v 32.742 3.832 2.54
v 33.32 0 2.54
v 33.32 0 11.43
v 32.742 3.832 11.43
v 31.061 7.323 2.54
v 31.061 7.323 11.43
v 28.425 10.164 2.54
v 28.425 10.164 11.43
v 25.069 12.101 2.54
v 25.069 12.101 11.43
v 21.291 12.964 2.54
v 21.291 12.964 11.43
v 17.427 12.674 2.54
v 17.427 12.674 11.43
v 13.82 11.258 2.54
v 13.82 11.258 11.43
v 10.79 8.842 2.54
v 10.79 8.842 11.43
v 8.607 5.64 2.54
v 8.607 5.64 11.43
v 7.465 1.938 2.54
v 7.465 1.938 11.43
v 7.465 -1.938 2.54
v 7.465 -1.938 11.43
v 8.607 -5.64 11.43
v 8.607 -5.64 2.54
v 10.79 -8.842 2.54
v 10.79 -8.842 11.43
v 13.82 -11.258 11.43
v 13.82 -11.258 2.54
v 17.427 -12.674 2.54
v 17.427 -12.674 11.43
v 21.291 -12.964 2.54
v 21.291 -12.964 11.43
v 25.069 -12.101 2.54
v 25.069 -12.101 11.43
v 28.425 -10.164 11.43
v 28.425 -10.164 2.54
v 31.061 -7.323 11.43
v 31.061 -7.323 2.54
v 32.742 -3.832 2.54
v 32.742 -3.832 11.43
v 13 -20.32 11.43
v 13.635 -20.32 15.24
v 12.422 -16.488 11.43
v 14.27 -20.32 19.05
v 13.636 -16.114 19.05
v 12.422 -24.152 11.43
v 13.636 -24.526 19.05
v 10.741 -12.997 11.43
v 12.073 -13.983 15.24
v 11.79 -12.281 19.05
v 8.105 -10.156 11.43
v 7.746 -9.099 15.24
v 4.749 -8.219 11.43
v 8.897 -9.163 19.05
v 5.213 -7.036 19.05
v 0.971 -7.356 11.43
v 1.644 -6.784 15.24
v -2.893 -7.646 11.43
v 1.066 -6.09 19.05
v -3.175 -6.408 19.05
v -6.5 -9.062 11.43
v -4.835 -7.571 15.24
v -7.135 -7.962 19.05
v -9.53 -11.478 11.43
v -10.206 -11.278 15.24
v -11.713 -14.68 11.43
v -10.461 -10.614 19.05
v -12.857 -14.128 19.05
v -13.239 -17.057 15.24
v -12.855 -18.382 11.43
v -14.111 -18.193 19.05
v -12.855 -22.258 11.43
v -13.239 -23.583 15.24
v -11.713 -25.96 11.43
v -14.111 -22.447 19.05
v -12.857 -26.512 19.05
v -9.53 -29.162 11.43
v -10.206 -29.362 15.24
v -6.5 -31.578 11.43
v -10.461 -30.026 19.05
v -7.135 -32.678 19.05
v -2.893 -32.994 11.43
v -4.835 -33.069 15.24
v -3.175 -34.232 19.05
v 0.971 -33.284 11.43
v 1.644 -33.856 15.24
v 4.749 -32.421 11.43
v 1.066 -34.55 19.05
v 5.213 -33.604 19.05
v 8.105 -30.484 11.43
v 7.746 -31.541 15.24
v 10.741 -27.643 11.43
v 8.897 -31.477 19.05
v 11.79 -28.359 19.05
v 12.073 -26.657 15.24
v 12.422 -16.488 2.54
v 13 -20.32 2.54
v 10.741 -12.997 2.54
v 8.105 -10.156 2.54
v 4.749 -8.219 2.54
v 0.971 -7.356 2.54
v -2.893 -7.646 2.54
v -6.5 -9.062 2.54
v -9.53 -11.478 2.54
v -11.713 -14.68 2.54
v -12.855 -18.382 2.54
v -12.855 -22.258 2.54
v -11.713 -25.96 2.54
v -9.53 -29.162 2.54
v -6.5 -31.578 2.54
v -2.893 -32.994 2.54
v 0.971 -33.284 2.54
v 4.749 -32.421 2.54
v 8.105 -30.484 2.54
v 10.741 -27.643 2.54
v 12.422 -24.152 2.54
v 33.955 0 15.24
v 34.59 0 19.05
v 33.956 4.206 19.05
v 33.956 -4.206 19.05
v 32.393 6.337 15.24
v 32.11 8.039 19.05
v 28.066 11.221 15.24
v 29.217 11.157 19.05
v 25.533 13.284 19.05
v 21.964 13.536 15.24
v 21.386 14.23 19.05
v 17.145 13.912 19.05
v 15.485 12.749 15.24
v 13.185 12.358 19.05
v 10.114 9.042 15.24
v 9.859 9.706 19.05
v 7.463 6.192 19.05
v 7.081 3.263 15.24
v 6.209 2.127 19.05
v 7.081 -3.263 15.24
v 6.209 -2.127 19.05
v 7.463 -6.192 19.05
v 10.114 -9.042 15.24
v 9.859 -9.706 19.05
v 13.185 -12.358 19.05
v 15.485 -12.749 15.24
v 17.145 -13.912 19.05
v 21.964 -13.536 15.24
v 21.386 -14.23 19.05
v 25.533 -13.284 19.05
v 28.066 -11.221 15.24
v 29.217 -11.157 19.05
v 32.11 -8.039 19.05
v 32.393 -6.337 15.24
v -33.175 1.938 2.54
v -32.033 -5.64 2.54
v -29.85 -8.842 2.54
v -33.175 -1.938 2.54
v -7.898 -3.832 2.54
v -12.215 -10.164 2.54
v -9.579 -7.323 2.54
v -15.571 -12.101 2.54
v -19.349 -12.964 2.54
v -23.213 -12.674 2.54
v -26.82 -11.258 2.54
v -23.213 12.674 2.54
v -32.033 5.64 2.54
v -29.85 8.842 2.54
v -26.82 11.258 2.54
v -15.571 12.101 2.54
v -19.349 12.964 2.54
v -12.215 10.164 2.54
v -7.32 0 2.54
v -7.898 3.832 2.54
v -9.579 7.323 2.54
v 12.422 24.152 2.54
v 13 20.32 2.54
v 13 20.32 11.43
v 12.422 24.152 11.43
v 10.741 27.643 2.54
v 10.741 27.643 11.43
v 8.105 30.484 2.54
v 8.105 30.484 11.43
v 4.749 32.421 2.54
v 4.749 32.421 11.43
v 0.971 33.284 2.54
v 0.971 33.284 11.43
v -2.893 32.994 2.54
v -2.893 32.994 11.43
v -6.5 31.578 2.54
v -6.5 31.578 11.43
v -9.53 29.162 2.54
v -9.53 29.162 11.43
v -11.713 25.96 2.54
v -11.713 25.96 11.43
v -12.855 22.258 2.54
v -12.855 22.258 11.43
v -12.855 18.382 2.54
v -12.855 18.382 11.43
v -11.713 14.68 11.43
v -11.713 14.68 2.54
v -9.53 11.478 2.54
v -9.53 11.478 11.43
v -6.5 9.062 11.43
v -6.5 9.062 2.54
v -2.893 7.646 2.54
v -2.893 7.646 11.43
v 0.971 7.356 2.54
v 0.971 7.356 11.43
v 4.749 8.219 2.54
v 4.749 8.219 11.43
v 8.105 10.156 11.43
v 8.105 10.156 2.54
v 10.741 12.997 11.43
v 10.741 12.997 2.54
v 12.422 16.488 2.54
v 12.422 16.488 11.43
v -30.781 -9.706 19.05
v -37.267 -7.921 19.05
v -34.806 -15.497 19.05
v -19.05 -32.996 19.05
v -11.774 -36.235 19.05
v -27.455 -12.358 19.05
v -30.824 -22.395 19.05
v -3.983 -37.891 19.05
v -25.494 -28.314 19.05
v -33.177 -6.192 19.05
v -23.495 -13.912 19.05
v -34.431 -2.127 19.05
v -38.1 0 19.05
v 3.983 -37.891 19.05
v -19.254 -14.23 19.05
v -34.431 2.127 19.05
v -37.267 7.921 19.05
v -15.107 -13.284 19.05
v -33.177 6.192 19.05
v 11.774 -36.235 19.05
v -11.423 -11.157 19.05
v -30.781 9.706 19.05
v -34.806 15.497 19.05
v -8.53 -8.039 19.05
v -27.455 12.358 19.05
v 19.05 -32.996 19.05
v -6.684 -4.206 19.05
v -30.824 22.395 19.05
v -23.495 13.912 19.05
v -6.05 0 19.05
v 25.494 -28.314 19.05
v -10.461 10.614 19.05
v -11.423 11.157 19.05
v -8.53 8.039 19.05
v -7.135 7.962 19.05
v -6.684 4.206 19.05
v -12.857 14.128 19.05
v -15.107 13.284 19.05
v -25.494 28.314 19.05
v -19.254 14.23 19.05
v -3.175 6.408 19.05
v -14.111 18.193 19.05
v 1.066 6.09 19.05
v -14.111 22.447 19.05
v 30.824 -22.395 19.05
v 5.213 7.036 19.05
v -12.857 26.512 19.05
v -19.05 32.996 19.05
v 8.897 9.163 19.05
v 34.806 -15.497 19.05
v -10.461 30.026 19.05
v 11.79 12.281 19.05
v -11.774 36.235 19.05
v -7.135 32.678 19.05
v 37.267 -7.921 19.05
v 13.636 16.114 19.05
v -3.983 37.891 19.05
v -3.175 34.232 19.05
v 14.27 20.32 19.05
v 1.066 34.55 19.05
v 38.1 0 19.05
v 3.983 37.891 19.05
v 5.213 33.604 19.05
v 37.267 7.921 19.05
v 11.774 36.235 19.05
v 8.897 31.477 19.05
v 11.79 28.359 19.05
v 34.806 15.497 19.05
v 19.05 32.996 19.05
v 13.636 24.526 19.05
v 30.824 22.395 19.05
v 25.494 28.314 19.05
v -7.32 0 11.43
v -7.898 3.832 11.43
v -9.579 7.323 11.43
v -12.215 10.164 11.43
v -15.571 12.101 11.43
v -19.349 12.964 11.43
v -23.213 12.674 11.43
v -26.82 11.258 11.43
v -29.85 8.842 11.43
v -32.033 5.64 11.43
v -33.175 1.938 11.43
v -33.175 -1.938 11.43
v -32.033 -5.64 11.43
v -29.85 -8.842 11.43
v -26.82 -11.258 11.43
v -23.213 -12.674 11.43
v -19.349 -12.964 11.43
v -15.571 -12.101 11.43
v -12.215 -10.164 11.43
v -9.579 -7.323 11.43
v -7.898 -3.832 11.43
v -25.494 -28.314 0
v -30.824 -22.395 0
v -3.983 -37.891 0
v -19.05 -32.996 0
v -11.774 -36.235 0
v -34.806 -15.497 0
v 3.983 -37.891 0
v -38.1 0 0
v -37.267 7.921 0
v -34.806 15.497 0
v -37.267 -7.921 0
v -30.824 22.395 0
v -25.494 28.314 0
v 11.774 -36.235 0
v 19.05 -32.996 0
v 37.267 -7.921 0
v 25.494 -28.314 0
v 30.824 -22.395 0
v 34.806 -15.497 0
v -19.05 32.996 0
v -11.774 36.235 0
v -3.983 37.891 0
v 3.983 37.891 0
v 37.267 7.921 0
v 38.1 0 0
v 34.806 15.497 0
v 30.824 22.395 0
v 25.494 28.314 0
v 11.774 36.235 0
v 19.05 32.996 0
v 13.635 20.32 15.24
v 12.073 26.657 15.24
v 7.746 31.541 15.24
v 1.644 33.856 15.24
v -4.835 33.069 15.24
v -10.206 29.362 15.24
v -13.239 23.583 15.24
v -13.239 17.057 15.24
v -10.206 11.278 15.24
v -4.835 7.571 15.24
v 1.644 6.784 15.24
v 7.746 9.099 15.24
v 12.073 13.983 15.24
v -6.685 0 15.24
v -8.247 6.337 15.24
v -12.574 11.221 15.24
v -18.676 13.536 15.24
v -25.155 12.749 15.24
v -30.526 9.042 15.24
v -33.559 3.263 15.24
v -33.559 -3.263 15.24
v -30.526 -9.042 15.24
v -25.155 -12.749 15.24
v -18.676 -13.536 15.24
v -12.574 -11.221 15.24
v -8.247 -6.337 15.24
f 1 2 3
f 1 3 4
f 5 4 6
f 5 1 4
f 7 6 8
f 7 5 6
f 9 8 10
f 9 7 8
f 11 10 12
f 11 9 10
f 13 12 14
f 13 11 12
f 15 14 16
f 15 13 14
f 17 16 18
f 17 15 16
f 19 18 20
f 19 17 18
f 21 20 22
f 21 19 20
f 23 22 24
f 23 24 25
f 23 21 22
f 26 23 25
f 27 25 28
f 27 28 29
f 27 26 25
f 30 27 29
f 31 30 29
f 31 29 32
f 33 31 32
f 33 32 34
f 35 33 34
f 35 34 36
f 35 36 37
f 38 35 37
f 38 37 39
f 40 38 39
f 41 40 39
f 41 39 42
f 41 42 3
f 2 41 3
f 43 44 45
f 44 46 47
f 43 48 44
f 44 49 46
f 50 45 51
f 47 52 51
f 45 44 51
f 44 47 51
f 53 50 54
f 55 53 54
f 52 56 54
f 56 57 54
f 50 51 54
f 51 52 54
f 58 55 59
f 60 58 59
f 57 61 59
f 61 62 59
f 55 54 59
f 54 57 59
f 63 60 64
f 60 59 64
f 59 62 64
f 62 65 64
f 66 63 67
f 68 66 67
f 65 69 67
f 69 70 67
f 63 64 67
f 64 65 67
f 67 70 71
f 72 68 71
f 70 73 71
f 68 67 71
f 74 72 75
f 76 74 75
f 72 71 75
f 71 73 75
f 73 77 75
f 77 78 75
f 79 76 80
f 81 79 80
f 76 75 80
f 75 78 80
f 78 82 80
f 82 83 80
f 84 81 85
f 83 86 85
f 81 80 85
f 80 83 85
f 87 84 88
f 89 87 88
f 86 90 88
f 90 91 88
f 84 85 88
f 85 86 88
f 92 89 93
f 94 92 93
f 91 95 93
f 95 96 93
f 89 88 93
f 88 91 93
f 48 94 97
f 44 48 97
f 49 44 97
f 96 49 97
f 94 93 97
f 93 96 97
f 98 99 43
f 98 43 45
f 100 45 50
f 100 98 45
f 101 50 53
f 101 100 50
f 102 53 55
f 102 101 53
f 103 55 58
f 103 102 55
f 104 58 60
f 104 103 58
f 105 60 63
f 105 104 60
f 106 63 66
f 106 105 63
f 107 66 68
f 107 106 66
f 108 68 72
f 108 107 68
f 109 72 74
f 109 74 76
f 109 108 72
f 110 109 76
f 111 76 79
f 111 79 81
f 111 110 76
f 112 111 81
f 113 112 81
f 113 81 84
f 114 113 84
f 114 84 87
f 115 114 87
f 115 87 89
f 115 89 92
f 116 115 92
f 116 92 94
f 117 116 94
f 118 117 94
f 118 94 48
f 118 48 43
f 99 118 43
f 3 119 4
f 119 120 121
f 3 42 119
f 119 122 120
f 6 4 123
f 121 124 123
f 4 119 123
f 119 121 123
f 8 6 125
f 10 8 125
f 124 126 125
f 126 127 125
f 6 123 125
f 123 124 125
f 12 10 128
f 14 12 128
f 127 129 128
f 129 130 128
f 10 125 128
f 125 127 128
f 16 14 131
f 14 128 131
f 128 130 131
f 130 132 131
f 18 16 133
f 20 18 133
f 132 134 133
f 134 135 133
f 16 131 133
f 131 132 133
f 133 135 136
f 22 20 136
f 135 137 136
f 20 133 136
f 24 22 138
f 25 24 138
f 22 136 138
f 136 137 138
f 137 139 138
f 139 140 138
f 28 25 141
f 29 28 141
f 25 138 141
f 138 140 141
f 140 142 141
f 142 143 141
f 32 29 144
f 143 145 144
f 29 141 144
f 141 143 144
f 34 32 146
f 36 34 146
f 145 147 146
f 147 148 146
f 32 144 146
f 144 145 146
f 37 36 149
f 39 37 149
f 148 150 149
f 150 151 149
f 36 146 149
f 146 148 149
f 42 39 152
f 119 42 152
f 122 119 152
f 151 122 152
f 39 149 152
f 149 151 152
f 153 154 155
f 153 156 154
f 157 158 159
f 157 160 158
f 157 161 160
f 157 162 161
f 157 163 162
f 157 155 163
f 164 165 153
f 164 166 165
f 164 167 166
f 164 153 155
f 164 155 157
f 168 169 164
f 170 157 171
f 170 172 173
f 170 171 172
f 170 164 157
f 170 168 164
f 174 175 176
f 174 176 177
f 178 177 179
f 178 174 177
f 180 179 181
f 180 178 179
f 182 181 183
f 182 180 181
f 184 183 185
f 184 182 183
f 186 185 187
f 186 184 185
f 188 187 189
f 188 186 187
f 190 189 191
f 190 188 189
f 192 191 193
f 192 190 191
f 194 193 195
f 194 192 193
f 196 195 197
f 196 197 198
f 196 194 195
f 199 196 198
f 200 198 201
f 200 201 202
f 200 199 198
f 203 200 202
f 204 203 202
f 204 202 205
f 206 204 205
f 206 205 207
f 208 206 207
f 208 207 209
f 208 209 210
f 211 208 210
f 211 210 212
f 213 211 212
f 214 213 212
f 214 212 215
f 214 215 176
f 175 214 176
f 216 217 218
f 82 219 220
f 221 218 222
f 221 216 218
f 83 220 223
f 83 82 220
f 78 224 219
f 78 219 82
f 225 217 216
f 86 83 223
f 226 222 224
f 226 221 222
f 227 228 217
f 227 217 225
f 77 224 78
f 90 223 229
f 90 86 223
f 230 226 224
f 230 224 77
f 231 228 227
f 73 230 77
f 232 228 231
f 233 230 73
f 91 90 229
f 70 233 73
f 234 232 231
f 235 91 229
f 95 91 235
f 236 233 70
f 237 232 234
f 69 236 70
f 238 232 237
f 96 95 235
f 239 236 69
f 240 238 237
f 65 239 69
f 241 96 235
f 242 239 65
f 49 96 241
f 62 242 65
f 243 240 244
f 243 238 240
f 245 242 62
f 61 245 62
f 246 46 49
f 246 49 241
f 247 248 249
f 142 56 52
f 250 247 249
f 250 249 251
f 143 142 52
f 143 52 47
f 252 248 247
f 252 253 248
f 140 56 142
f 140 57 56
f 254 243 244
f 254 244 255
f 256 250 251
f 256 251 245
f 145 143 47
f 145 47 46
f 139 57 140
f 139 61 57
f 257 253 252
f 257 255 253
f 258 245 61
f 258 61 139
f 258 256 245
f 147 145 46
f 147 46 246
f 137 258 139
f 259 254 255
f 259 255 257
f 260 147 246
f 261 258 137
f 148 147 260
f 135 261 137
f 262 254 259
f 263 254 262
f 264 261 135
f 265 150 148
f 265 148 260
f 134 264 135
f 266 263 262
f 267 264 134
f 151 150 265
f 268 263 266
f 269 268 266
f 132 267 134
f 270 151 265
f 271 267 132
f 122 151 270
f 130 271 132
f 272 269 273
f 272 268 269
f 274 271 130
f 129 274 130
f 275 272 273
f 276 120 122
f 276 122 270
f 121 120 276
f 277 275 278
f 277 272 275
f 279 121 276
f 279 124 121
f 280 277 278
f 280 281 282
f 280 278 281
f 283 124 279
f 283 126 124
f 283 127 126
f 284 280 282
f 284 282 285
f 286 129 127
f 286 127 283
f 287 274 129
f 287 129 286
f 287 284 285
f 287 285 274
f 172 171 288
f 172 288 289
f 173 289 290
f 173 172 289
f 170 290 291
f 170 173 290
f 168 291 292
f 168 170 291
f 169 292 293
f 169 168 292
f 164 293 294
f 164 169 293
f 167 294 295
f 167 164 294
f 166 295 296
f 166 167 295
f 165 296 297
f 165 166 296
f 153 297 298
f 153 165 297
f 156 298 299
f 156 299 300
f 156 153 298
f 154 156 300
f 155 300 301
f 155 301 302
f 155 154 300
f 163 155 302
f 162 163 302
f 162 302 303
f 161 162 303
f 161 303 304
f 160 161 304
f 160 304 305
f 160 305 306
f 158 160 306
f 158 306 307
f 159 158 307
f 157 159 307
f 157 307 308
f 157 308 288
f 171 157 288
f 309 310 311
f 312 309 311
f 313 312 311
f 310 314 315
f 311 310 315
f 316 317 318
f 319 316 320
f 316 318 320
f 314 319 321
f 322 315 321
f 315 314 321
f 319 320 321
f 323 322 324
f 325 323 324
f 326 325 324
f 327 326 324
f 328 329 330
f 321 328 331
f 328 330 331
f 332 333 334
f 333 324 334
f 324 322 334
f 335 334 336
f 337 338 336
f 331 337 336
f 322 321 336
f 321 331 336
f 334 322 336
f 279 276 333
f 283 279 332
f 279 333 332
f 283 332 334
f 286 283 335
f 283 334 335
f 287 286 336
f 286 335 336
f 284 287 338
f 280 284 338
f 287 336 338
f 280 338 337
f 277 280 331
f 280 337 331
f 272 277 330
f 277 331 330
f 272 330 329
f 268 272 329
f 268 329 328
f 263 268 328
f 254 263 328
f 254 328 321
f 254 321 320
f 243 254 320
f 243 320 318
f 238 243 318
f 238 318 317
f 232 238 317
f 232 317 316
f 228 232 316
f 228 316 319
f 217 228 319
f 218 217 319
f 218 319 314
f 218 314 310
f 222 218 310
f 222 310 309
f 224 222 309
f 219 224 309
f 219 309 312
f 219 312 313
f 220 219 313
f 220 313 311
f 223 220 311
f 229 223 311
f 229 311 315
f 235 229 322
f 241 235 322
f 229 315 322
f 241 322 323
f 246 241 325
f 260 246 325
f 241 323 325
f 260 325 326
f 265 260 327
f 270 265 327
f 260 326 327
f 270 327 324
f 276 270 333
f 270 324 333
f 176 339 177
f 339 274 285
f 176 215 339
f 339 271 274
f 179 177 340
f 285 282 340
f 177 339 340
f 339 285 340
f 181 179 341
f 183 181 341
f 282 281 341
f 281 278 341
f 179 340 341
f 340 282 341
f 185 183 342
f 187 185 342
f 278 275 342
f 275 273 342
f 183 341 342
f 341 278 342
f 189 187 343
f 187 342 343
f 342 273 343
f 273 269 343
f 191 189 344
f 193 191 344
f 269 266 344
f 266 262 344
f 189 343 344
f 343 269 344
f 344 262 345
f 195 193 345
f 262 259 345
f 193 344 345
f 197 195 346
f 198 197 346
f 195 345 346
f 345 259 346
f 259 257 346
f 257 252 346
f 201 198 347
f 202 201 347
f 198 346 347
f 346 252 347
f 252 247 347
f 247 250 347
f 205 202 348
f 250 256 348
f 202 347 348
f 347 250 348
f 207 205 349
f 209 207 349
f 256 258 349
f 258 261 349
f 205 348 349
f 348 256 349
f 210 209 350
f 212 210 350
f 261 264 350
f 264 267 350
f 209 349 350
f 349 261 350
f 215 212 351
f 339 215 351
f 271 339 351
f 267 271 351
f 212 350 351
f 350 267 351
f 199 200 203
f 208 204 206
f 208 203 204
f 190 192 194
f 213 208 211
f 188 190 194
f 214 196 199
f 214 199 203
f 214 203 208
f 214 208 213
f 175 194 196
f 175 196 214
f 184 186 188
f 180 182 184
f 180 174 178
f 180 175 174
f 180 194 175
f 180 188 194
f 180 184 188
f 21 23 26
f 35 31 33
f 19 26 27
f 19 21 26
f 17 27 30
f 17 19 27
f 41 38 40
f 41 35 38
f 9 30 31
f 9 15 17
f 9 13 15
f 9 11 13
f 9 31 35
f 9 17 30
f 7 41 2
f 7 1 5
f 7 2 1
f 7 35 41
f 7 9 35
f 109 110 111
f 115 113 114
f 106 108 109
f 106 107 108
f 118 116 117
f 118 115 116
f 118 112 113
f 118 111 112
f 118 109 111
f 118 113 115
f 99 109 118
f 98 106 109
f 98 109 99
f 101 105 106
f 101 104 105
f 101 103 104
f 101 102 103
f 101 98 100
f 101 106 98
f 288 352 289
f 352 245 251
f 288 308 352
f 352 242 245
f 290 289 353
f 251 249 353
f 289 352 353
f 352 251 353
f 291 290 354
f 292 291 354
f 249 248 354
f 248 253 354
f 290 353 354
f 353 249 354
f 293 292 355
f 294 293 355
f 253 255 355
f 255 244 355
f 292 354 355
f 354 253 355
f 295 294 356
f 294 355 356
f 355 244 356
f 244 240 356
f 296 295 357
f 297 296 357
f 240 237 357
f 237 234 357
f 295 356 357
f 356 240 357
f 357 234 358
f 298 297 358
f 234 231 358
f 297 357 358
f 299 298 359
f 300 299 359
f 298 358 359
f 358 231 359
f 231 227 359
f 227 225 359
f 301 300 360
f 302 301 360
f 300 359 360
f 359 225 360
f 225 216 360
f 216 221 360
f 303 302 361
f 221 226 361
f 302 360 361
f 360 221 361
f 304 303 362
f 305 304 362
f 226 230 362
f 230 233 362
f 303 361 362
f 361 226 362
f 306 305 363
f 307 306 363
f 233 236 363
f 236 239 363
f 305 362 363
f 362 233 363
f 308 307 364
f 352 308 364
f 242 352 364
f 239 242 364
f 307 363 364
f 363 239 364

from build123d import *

# Parameters (mm, degrees)
F0_R       = 38.1
F0_R_2     = 3.175
F0_R_3     = 13
F1_DEPTH   = 19.05
F2_DEPTH   = 2.54
F3_SIZE2   = 1.27
F3_SIZE    = 7.62
F3_2_SIZE2 = 1.27
F3_2_SIZE  = 7.62
F3_3_SIZE2 = 1.27
F3_3_SIZE  = 7.62
F3_4_SIZE2 = 1.27
F3_4_SIZE  = 7.62


with BuildPart() as f1:
    # F0 (on Top) → F1 (new body)
    with BuildSketch(Plane.XY):
        Circle(F0_R)
        with Locations((-21.5526146906, -21.5526146906)):
            Circle(F0_R_2, mode=Mode.SUBTRACT)
        with Locations((0, -20.32)):
            Circle(F0_R_3, mode=Mode.SUBTRACT)
        with Locations((21.5526146906, -21.5526146906)):
            Circle(F0_R_2, mode=Mode.SUBTRACT)
        with Locations((-20.32, 0)):
            Circle(F0_R_3, mode=Mode.SUBTRACT)
        with Locations((-21.5526146906, 21.5526146906)):
            Circle(F0_R_2, mode=Mode.SUBTRACT)
        with Locations((20.32, 0)):
            Circle(F0_R_3, mode=Mode.SUBTRACT)
        with Locations((0, 20.32)):
            Circle(F0_R_3, mode=Mode.SUBTRACT)
        with Locations((21.5526146906, 21.5526146906)):
            Circle(F0_R_2, mode=Mode.SUBTRACT)
        with Locations((-21.5526146906, 21.5526146906)):
            Circle(F0_R_2)
        with Locations((-21.5526146906, -21.5526146906)):
            Circle(F0_R_2)
        with Locations((21.5526146906, -21.5526146906)):
            Circle(F0_R_2)
        with Locations((21.5526146906, 21.5526146906)):
            Circle(F0_R_2)
    extrude(amount=F1_DEPTH)

    # F0 (on Top) → F2 (join)
    with BuildSketch(Plane.XY):
        Circle(F0_R)
        with Locations((-21.5526146906, -21.5526146906)):
            Circle(F0_R_2, mode=Mode.SUBTRACT)
        with Locations((0, -20.32)):
            Circle(F0_R_3, mode=Mode.SUBTRACT)
        with Locations((21.5526146906, -21.5526146906)):
            Circle(F0_R_2, mode=Mode.SUBTRACT)
        with Locations((-20.32, 0)):
            Circle(F0_R_3, mode=Mode.SUBTRACT)
        with Locations((-21.5526146906, 21.5526146906)):
            Circle(F0_R_2, mode=Mode.SUBTRACT)
        with Locations((20.32, 0)):
            Circle(F0_R_3, mode=Mode.SUBTRACT)
        with Locations((0, 20.32)):
            Circle(F0_R_3, mode=Mode.SUBTRACT)
        with Locations((21.5526146906, 21.5526146906)):
            Circle(F0_R_2, mode=Mode.SUBTRACT)
        with Locations((-20.32, 0)):
            Circle(F0_R_3)
        with Locations((0, -20.32)):
            Circle(F0_R_3)
        with Locations((20.32, 0)):
            Circle(F0_R_3)
        with Locations((0, 20.32)):
            Circle(F0_R_3)
    extrude(amount=F2_DEPTH)

    # F3
    f3_edges = [f1.edges().sort_by_distance(p)[0] for p in [
        (-13, -20.32, 19.05),
    ]]
    f3_side = f1.faces().sort_by_distance((-13, -20.32, 10.795))[0]
    chamfer(f3_edges, length=F3_SIZE, length2=F3_SIZE2, reference=f3_side)

    # F3#2
    f3_2_edges = [f1.edges().sort_by_distance(p)[0] for p in [
        (-33.32, 0, 19.05),
    ]]
    f3_2_side = f1.faces().sort_by_distance((-33.32, 0, 10.795))[0]
    chamfer(f3_2_edges, length=F3_2_SIZE, length2=F3_2_SIZE2, reference=f3_2_side)

    # F3#3
    f3_3_edges = [f1.edges().sort_by_distance(p)[0] for p in [
        (-13, 20.32, 19.05),
    ]]
    f3_3_side = f1.faces().sort_by_distance((-13, 20.32, 10.795))[0]
    chamfer(f3_3_edges, length=F3_3_SIZE, length2=F3_3_SIZE2, reference=f3_3_side)

    # F3#4
    f3_4_edges = [f1.edges().sort_by_distance(p)[0] for p in [
        (7.32, 0, 19.05),
    ]]
    f3_4_side = f1.faces().sort_by_distance((7.32, 0, 10.795))[0]
    chamfer(f3_4_edges, length=F3_4_SIZE, length2=F3_4_SIZE2, reference=f3_4_side)


solid = f1.part
